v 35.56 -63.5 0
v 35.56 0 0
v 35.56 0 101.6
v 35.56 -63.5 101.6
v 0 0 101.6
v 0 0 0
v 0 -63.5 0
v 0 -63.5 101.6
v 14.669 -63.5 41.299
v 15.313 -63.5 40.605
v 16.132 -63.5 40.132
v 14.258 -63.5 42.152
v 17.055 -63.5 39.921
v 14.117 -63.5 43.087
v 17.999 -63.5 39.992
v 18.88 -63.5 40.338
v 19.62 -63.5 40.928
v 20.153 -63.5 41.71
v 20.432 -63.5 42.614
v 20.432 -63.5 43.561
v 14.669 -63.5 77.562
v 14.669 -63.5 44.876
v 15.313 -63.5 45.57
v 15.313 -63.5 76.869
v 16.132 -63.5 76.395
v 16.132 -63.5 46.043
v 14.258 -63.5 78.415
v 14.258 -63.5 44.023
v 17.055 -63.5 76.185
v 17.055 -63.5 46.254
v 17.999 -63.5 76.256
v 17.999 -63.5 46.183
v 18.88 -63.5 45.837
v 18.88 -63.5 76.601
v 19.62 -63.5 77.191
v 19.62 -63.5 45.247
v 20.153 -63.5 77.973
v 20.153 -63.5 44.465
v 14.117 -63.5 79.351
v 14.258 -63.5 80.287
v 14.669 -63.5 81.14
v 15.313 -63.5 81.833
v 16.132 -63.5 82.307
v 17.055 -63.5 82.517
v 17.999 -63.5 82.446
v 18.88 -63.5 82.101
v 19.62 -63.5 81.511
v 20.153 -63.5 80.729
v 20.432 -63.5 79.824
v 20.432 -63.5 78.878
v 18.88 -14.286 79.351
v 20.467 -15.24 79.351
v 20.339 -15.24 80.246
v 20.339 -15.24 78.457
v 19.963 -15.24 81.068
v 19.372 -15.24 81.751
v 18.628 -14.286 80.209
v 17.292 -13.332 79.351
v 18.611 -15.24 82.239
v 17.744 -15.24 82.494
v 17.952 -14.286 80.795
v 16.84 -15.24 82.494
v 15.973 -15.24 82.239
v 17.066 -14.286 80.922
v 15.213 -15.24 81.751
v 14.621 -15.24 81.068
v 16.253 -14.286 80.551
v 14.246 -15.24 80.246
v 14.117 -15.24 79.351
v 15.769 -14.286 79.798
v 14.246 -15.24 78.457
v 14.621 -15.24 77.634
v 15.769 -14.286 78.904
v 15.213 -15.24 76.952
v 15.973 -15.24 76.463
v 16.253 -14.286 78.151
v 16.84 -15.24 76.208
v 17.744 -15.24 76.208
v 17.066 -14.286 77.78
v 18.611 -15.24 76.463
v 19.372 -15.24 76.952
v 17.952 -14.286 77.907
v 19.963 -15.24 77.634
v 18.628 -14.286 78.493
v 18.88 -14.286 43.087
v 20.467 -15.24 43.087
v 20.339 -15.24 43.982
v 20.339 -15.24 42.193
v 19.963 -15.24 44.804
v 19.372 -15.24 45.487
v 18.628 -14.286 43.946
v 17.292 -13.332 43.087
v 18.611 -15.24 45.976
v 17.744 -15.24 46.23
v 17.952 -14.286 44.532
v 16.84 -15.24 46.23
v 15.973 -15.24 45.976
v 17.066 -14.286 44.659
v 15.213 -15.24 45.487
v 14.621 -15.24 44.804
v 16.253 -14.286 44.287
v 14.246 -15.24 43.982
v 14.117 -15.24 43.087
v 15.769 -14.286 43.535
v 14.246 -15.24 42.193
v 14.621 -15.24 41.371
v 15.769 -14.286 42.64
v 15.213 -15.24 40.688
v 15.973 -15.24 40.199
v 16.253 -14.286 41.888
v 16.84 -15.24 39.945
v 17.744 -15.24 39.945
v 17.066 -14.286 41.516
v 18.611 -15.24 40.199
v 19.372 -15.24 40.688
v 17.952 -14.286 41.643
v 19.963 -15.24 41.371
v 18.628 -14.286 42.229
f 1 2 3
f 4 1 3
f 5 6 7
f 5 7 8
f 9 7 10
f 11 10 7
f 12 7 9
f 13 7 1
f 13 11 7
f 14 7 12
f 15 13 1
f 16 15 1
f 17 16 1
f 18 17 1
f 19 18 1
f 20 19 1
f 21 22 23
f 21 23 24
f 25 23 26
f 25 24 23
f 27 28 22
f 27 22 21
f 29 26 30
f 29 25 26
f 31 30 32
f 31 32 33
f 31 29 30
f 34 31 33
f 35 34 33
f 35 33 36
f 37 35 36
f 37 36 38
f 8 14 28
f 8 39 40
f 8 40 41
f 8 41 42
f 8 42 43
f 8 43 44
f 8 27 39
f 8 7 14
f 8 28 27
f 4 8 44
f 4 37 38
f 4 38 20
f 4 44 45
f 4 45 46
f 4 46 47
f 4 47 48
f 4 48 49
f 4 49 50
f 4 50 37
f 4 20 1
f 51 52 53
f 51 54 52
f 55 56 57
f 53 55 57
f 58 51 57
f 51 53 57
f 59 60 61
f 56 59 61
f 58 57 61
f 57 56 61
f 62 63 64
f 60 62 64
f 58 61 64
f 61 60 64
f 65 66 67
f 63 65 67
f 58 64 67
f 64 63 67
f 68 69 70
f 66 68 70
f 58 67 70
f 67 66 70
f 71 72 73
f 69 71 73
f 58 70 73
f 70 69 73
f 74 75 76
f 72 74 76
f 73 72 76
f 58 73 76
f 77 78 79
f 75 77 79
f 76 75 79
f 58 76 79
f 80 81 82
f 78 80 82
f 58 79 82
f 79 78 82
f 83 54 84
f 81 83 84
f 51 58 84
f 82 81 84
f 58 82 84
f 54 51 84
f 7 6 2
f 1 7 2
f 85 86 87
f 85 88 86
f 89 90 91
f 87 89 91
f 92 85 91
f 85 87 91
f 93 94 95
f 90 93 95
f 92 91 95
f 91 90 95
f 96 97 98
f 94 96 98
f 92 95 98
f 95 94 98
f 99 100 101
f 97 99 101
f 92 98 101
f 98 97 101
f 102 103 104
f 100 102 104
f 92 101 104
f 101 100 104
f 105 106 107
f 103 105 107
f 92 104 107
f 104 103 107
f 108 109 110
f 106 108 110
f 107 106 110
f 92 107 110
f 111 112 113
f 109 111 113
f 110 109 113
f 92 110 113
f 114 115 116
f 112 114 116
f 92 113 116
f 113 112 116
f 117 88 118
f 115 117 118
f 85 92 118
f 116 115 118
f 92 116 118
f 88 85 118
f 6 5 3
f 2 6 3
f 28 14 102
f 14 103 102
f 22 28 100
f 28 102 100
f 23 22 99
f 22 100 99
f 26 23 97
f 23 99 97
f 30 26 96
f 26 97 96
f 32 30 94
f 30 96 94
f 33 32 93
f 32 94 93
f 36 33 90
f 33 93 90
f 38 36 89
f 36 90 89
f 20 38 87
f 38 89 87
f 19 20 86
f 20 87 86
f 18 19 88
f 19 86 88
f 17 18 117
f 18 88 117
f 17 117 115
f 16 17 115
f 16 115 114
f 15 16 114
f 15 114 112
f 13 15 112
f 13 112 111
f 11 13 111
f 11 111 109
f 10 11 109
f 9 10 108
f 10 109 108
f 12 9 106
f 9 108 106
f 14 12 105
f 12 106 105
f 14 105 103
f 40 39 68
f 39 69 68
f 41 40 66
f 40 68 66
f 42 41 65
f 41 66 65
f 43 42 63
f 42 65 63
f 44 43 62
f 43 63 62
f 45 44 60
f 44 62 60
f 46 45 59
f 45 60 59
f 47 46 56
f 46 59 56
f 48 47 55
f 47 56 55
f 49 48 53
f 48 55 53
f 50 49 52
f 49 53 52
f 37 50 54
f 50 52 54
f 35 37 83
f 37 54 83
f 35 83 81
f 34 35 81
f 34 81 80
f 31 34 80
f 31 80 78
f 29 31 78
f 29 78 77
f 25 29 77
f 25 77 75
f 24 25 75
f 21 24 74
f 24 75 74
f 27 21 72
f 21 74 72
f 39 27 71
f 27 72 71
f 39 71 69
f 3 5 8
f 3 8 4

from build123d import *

# Parameters (mm, degrees)
F0_W     = 35.56
F0_H     = 101.6
F1_DEPTH = 63.5
F3_D     = 6.35
F3_DEPTH = 48.26
F3_TIP   = 1.9077324654


with BuildPart() as f1:
    # F0 (on Front) → F1 (new body)
    with BuildSketch(Plane.XZ):
        with Locations((17.78, 50.8)):
            Rectangle(F0_W, F0_H)
    extrude(amount=F1_DEPTH)

    # F3
    with Locations(Plane.XZ.offset(63.5)):
        with Locations((17.2923281789, 43.087489903), (17.2923281789, 79.351015389)):
            Hole(F3_D / 2, depth=F3_DEPTH)
            with Locations((0, 0, -(F3_DEPTH + F3_TIP / 2))):  # 118° drill point
                Cone(0, F3_D / 2, F3_TIP, mode=Mode.SUBTRACT)


solid = f1.part
